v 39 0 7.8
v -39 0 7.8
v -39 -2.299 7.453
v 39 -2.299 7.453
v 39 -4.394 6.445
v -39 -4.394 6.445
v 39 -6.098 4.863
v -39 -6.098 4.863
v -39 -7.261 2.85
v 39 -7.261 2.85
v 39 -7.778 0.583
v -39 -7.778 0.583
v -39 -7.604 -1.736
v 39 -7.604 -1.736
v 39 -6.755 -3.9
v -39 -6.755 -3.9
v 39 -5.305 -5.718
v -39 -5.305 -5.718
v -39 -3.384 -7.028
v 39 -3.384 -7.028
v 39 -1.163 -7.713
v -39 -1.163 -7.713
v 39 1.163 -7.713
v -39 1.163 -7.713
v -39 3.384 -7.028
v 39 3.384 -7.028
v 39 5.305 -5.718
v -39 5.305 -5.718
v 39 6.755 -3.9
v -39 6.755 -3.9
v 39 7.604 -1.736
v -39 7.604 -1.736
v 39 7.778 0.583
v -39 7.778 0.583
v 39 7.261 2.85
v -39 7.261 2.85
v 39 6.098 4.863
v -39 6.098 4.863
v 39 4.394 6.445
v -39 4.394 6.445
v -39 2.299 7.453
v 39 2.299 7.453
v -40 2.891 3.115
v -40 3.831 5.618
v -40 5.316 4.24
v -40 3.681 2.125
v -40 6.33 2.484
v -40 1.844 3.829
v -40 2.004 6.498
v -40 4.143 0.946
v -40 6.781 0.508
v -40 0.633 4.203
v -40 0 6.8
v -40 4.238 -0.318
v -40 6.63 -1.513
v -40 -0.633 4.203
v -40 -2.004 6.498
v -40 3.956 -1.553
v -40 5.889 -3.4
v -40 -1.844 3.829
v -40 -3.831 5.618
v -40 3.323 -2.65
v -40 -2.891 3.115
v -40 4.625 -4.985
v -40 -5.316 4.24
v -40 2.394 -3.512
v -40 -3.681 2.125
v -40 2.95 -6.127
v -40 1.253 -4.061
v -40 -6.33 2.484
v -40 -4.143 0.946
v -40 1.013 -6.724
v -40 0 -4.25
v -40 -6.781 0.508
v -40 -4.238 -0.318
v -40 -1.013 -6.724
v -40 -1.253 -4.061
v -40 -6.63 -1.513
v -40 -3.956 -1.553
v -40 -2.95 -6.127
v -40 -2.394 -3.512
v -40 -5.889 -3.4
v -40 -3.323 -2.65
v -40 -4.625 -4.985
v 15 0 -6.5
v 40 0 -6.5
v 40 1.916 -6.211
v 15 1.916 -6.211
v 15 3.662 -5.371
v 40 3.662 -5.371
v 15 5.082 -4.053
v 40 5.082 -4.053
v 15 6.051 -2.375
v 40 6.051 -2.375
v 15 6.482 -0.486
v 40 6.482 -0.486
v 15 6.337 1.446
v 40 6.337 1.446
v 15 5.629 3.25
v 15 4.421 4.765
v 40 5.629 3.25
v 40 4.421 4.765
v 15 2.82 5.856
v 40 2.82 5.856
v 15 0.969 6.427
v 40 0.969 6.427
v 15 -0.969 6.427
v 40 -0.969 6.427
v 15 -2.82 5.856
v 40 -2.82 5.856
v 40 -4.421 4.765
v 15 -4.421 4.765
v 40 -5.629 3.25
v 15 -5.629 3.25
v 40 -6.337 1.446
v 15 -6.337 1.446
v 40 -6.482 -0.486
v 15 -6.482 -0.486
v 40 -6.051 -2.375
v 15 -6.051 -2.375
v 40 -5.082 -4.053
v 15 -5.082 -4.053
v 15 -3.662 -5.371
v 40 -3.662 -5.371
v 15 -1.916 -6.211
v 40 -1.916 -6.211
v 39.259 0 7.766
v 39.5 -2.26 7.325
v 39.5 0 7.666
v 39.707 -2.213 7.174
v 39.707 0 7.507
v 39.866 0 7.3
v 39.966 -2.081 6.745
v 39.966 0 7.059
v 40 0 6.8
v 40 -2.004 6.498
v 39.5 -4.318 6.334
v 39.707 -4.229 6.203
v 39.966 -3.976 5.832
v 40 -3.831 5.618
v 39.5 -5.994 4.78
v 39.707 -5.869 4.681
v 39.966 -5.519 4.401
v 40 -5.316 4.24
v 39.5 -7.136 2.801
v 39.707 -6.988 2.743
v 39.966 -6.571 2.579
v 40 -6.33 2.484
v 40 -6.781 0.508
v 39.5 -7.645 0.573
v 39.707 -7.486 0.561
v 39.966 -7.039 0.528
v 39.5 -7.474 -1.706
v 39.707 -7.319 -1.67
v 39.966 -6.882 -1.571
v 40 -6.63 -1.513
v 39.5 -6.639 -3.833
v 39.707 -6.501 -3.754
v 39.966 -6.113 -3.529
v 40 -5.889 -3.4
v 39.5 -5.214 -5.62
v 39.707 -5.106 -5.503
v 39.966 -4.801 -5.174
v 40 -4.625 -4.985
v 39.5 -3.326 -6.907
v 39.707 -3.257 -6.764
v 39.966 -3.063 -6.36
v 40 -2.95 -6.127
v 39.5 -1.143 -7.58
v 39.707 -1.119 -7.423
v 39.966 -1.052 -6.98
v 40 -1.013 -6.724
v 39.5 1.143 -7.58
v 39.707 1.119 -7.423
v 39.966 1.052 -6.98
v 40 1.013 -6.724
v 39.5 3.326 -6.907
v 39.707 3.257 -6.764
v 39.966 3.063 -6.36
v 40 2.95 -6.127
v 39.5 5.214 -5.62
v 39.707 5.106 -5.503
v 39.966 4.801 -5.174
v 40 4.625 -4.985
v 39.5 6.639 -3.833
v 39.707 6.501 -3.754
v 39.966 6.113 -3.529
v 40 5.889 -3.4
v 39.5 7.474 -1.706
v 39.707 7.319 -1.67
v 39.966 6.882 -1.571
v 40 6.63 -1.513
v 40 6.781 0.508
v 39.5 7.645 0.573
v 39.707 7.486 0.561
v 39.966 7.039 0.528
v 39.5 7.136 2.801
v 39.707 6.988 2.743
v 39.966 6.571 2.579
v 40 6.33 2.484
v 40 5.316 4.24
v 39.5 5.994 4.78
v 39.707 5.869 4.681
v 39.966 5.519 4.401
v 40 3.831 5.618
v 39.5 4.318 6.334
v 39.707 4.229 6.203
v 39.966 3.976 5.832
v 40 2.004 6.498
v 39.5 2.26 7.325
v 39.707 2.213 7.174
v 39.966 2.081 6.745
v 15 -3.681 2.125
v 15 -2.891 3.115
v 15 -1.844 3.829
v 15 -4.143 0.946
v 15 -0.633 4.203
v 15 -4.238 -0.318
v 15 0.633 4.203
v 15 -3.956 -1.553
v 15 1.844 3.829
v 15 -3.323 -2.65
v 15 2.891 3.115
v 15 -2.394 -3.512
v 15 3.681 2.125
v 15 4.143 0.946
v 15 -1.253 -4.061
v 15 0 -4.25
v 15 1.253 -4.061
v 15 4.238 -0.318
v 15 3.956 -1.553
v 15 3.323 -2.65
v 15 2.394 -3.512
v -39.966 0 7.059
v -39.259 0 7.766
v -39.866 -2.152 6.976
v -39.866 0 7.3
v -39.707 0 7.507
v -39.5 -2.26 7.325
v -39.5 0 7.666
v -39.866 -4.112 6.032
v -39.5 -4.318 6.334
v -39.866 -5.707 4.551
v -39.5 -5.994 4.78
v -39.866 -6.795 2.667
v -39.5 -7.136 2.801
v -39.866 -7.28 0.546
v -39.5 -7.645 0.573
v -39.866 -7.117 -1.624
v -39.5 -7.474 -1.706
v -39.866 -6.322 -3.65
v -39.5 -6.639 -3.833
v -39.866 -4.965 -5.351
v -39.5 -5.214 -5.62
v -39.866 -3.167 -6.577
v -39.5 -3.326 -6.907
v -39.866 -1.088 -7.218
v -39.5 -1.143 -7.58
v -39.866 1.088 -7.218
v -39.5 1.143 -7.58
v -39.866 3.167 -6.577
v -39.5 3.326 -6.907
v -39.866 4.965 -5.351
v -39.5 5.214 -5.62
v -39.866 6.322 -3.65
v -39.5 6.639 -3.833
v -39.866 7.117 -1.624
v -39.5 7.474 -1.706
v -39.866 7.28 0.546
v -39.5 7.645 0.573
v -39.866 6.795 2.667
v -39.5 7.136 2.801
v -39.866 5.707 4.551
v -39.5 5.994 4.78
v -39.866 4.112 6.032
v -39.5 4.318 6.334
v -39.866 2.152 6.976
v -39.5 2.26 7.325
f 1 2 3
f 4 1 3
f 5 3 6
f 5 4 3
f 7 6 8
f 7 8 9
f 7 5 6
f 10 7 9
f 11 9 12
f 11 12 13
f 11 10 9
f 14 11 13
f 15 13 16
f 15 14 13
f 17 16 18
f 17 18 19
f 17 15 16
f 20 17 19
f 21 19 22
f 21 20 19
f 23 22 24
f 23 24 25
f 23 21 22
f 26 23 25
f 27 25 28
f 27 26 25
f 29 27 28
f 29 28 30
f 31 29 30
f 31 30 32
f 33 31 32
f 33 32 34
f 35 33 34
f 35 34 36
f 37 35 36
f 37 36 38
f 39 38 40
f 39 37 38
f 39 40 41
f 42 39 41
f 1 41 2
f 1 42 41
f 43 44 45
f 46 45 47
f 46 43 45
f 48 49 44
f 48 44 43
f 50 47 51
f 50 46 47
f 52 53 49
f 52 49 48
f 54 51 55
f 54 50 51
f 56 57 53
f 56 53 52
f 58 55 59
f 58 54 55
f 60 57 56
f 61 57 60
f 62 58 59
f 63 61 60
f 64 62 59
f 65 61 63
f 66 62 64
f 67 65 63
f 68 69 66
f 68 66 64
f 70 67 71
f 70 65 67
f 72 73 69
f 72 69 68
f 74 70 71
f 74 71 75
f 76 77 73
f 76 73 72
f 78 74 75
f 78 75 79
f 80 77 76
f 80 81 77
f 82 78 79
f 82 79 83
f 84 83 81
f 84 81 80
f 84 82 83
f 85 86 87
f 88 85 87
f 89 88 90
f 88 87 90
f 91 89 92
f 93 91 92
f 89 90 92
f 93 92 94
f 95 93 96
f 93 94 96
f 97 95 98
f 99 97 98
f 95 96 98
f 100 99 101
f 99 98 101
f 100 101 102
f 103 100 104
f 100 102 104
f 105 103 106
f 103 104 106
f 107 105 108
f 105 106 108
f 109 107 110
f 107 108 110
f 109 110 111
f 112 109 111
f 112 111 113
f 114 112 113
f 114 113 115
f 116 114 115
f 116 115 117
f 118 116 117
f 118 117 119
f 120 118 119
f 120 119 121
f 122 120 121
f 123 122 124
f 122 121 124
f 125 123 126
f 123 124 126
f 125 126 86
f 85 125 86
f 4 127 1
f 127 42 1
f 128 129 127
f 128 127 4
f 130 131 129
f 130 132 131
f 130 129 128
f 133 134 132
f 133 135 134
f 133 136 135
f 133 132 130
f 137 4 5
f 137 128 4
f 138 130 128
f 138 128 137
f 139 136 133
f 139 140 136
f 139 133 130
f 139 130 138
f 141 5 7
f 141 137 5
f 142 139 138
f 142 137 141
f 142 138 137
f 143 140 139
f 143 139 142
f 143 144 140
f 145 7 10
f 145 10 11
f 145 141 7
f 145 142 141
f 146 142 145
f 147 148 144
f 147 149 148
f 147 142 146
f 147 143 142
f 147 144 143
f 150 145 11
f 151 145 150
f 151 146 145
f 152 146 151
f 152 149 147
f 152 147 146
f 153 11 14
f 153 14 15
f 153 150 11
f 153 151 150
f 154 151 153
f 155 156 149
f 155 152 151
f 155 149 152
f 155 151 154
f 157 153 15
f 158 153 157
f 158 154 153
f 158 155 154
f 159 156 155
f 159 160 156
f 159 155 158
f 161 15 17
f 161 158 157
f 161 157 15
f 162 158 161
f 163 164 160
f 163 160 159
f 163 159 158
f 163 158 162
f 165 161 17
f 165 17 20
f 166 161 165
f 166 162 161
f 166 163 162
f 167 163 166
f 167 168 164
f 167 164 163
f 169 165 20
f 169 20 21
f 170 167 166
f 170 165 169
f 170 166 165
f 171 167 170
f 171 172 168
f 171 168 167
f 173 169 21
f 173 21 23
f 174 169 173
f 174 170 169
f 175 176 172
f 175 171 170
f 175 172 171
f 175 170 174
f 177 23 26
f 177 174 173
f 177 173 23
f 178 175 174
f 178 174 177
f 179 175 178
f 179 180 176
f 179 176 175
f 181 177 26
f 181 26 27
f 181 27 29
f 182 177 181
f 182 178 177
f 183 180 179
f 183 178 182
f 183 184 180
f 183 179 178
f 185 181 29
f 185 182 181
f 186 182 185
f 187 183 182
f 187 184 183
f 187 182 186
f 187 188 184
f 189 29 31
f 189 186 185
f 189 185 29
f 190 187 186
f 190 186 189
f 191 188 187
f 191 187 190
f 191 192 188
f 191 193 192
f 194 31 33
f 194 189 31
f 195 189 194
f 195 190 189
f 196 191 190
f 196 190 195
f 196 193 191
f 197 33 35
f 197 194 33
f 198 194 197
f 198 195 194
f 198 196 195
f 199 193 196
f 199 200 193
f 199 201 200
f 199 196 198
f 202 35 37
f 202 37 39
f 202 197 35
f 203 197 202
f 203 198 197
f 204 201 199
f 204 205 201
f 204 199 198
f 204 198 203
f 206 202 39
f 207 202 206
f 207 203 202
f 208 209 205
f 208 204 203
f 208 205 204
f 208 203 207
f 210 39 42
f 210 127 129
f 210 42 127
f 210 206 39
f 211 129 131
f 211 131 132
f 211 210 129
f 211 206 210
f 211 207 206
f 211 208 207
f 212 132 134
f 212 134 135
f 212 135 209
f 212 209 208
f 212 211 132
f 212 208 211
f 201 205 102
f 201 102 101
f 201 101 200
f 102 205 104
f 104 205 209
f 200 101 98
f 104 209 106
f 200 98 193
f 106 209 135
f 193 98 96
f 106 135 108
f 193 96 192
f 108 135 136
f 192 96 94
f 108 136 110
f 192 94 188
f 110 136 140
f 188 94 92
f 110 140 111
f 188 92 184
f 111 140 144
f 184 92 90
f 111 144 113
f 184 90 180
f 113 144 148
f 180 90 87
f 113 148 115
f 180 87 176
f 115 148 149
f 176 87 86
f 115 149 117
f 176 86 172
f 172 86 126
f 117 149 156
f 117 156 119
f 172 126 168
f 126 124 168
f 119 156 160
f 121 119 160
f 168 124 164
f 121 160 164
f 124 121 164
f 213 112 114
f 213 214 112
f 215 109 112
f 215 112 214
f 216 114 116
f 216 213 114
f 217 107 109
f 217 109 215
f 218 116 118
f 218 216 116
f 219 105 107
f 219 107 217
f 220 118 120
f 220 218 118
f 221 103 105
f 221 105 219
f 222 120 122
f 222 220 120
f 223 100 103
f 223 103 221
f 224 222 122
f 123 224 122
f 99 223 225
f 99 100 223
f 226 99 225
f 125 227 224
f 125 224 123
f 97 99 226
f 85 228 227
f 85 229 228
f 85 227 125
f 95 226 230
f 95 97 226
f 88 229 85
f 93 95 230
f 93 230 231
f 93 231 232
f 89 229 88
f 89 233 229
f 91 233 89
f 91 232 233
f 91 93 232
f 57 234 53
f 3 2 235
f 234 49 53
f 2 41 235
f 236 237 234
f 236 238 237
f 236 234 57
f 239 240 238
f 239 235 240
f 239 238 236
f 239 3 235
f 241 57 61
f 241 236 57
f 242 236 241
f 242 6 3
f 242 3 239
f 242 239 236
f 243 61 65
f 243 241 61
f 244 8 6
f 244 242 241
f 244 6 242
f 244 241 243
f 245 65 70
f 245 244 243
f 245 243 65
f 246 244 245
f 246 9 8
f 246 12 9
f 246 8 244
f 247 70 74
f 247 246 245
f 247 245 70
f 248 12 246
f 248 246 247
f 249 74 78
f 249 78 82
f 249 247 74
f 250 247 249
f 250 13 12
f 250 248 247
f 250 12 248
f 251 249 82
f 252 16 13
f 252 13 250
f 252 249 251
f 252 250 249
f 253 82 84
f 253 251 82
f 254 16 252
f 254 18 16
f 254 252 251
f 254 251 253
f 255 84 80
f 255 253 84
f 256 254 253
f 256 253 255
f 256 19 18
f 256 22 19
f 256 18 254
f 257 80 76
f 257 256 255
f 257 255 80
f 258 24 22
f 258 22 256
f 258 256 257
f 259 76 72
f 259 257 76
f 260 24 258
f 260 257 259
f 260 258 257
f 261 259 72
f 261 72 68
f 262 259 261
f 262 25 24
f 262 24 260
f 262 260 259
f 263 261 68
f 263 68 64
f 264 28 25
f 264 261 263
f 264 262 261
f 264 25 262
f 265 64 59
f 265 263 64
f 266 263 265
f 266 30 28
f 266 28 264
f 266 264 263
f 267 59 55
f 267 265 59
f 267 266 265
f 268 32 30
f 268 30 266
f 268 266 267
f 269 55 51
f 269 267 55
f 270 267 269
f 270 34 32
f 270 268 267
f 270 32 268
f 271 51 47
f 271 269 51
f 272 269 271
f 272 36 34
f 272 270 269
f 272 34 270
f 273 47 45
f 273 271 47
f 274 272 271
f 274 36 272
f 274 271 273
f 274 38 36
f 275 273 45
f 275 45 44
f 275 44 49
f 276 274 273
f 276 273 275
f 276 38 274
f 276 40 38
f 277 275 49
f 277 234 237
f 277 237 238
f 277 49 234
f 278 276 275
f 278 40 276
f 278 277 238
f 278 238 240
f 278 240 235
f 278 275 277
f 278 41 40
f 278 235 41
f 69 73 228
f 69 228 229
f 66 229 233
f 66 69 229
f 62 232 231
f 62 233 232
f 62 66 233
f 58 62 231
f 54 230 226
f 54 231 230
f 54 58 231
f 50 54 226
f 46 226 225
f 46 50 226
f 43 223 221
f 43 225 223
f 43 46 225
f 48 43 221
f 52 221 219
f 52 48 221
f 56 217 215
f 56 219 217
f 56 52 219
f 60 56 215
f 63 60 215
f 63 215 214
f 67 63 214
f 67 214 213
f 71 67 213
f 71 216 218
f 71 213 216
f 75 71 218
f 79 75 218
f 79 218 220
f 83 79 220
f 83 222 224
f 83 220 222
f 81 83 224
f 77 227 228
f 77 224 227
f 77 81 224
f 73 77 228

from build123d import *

# Parameters (mm, degrees)
ESBO_O1_W                  = 80
ESBO_O1_H                  = 7.8
ESBO_O2_R                  = 6.5
CORTE_EXTRUS_O1_DEPTH      = 25
CORTE_EXTRUS_O2_DEPTH      = 57.095276093
CORTE_EXTRUS_O2_DEPTH_BACK = 57.095276093
ESBO_O3_R                  = 4.25
FILETE1_R                  = 1


with BuildPart() as part:
    # Esboço1 → Revolução1 (revolve)
    with BuildSketch(Plane.XY, mode=Mode.PRIVATE) as revolu_o1_sk:
        with Locations((0, 3.9)):
            Rectangle(ESBO_O1_W, ESBO_O1_H)
    revolve(revolu_o1_sk.sketch.rotate(Axis((-40, 0, 0), (1, 0, 0)), 90), axis=Axis((-40, 0, 0), (1, 0, 0)))

    # Esboço2 → Corte-extrusão1 (cut)
    with BuildSketch(Plane(origin=(40, 0, 0), x_dir=(0, 0, -1), z_dir=(1, 0, 0))):
        Circle(ESBO_O2_R)
    extrude(amount=-CORTE_EXTRUS_O1_DEPTH, mode=Mode.SUBTRACT)

    # Esboço3 → Corte-extrusão2 (cut, two sides: drawn at the far end of the back side and taken through both)
    with BuildSketch(Plane(origin=(15, 0, 0), x_dir=(0, 0, -1), z_dir=(1, 0, 0)).offset(-CORTE_EXTRUS_O2_DEPTH_BACK)):
        Circle(ESBO_O3_R)
    extrude(amount=CORTE_EXTRUS_O2_DEPTH + CORTE_EXTRUS_O2_DEPTH_BACK, mode=Mode.SUBTRACT)

    # Filete1
    filete1_edges = [part.edges().sort_by_distance(p)[0] for p in [
        (-40, 0, -7.8),
        (40, 0, -7.8),
    ]]
    fillet(filete1_edges, radius=FILETE1_R)


solid = part.part
